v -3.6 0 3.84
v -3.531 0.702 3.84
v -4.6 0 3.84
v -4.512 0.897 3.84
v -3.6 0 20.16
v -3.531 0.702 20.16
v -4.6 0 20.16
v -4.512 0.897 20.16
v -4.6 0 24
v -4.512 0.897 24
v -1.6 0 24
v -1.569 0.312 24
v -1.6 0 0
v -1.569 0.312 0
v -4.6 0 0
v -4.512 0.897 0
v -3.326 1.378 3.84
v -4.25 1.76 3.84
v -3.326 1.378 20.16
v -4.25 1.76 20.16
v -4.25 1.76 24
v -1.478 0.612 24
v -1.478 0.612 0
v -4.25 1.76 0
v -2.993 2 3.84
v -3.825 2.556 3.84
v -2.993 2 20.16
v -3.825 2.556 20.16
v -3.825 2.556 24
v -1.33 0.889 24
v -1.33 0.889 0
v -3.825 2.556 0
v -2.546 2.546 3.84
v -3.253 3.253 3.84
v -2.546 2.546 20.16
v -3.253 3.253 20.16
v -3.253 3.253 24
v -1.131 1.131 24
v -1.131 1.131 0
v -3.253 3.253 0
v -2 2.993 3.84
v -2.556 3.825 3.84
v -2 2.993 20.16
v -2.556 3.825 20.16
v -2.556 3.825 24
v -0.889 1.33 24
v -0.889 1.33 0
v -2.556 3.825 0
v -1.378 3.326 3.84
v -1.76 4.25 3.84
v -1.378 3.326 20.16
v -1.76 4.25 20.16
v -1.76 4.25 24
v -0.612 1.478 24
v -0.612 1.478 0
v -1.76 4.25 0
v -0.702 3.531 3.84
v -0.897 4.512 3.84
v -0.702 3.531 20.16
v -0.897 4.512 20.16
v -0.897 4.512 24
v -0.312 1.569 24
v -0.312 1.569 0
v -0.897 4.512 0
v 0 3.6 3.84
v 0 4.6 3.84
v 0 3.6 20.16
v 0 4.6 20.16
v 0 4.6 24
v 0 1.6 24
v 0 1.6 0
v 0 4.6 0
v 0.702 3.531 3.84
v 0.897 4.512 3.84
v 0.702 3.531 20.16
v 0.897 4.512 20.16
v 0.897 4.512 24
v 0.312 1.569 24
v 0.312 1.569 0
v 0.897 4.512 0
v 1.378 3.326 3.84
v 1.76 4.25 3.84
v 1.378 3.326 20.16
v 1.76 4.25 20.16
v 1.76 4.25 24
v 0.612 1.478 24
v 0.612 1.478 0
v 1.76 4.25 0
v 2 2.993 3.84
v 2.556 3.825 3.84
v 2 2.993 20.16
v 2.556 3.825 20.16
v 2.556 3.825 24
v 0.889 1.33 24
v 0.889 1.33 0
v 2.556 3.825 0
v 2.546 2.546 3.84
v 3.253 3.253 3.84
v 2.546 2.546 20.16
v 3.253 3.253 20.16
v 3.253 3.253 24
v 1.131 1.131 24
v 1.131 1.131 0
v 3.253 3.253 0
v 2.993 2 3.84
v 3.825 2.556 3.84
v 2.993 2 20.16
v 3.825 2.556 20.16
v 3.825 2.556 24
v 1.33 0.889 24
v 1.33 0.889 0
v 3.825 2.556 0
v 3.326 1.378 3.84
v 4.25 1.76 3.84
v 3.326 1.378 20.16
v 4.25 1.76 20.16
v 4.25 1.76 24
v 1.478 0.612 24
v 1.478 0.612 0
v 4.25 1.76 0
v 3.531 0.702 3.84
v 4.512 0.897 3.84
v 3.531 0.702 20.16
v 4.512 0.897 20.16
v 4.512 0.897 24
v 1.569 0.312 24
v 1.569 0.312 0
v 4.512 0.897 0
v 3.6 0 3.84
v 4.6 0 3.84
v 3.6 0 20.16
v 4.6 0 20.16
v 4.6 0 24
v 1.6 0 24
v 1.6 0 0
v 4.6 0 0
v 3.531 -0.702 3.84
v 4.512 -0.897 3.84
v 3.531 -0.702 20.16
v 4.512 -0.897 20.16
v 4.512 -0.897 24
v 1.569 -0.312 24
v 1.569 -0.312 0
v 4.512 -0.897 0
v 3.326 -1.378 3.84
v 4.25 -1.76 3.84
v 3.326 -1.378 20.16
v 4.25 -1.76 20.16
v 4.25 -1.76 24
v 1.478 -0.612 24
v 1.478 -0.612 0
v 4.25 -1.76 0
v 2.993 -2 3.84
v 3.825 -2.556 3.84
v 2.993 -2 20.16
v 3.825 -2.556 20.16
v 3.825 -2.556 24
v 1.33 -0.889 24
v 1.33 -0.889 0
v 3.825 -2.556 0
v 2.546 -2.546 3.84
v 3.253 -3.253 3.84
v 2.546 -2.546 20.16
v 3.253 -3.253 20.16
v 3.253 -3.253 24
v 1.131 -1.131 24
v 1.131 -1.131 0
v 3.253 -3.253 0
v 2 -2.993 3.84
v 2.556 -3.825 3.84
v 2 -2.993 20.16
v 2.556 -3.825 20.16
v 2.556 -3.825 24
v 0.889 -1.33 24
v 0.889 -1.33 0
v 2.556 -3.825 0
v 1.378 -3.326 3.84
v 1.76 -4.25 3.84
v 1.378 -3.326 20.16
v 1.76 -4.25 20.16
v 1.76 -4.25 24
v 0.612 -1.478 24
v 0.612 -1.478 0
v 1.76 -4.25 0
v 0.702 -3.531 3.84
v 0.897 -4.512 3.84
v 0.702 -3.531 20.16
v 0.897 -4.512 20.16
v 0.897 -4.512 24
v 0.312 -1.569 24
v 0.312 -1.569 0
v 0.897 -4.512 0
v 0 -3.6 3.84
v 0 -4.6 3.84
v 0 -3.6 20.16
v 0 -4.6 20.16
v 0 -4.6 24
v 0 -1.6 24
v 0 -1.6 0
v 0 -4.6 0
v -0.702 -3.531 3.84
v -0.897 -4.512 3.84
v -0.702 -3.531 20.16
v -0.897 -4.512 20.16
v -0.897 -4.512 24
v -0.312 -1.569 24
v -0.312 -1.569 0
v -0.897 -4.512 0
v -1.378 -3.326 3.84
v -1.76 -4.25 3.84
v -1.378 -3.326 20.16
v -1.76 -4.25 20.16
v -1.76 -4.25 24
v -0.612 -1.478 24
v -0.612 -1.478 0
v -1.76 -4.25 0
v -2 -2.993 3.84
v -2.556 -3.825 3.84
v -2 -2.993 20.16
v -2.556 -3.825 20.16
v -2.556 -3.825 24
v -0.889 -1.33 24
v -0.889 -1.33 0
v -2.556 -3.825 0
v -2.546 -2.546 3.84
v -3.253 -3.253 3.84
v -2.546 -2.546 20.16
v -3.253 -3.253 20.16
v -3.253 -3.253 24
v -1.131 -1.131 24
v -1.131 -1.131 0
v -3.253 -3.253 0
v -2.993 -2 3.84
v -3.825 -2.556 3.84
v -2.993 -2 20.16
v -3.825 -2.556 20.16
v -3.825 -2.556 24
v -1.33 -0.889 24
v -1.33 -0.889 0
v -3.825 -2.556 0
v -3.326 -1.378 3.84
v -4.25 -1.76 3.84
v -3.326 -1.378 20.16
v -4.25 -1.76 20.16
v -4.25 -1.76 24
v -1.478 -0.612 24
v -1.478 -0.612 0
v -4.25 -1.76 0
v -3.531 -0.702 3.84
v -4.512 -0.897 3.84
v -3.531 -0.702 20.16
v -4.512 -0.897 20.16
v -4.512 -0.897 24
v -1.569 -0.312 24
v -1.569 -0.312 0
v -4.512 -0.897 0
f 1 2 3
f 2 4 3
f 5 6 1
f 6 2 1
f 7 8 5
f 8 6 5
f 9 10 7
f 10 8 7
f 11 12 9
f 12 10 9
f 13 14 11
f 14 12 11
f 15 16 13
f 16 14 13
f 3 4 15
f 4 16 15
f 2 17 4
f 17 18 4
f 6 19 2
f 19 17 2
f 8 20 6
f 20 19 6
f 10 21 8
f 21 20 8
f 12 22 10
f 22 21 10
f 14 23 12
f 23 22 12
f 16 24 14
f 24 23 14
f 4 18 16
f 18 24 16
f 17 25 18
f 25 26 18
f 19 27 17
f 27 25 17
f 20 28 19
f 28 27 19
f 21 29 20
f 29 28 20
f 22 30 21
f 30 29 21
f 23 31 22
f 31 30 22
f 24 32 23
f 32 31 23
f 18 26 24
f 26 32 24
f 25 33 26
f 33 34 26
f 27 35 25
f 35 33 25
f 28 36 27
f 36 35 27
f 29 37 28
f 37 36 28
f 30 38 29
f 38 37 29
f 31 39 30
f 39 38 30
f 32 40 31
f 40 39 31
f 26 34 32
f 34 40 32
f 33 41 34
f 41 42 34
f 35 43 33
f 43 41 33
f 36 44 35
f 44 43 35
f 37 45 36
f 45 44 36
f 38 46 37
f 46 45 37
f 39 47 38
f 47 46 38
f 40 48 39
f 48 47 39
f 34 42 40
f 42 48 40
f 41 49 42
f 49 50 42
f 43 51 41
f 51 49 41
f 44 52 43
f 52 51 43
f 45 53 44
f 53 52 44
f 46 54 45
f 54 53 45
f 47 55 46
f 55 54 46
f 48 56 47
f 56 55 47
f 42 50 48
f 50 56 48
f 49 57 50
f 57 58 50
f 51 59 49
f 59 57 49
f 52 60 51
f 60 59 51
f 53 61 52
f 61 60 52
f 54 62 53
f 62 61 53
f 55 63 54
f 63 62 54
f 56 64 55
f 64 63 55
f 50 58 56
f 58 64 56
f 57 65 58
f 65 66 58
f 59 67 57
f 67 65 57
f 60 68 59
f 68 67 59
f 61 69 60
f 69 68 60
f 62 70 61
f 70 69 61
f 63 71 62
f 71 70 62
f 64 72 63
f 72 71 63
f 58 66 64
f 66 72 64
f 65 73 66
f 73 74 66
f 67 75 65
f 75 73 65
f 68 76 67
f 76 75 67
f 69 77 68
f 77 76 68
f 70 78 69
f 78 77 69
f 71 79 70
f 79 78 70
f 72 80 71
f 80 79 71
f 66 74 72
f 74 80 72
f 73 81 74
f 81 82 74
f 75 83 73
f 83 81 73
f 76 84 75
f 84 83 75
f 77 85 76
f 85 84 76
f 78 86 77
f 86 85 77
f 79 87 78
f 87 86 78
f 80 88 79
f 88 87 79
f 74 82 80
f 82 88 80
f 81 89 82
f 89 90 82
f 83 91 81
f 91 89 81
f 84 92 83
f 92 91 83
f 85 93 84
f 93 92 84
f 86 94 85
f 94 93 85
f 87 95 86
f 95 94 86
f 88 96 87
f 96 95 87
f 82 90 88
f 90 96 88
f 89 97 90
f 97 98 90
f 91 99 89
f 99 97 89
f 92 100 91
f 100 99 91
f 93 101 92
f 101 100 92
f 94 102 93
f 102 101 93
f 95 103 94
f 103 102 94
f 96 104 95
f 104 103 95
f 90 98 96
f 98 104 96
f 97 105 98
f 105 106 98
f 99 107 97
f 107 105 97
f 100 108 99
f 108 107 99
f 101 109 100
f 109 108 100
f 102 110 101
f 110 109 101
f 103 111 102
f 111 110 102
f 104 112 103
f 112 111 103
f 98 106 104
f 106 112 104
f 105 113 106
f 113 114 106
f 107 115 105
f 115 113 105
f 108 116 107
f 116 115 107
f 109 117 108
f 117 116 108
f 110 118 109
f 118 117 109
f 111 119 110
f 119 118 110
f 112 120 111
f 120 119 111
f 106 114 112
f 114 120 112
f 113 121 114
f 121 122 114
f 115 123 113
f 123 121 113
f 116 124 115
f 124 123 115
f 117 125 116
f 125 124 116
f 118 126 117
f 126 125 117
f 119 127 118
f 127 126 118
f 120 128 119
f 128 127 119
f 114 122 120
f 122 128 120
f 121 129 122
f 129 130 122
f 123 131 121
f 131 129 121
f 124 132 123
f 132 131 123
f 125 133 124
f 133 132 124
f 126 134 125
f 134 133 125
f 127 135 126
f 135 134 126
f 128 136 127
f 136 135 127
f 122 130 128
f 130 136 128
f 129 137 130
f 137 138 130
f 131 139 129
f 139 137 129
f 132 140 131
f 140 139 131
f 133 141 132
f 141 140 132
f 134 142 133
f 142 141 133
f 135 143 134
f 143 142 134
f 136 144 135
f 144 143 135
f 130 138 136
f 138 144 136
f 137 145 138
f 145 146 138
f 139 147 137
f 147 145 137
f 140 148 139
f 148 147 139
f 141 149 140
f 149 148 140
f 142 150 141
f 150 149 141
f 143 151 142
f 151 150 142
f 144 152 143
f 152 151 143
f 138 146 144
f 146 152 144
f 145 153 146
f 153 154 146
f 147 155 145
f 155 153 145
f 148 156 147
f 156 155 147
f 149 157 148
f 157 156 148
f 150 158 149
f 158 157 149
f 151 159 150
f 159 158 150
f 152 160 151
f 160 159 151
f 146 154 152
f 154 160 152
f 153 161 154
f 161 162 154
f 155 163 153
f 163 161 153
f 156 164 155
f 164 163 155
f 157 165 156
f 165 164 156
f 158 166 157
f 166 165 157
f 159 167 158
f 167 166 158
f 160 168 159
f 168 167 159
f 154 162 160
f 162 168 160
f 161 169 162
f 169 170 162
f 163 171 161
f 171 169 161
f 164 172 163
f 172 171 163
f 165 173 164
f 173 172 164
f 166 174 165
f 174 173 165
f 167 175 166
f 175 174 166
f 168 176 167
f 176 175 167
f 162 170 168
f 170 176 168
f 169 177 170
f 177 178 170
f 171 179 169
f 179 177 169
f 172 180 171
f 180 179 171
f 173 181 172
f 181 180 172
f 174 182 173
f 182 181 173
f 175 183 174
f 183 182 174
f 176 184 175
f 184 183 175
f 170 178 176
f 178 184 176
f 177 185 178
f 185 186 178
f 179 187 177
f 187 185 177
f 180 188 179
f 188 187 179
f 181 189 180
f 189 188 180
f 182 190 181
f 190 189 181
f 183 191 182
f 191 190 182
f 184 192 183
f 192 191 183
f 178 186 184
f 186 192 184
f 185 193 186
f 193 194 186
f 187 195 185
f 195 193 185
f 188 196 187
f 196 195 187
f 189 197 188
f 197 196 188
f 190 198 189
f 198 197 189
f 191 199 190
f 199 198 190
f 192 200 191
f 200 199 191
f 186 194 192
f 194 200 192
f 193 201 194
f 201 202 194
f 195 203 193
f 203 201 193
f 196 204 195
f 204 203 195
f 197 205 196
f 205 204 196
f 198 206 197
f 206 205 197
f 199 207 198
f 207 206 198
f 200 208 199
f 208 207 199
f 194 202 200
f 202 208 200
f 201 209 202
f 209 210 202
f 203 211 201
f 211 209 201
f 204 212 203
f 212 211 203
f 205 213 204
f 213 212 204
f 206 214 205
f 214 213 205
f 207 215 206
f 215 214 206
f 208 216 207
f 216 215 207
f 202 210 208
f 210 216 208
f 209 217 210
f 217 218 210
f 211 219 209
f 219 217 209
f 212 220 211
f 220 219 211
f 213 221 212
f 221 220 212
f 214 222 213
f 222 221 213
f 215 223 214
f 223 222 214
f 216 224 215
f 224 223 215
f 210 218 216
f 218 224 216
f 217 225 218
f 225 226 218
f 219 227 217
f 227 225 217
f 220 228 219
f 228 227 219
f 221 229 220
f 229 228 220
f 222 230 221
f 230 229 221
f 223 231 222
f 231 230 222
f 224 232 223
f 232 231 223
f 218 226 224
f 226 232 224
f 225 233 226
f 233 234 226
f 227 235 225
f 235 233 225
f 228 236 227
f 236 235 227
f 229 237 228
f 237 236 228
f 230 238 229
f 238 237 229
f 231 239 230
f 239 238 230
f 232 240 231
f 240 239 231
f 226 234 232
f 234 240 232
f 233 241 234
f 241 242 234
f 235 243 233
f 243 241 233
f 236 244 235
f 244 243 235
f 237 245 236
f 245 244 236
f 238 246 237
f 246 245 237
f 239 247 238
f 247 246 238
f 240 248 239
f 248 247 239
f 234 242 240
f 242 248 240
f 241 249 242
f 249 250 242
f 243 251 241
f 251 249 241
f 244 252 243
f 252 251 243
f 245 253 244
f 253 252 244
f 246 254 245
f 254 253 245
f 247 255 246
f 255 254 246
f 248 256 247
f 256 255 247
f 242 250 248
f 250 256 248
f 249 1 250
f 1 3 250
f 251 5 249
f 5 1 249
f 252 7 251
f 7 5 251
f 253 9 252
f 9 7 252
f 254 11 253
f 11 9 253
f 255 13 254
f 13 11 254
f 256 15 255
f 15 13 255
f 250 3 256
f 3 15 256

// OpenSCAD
$fn = 32;

// ----------------------------------------------------------------------
// Profiled standoff: spool spacer, 24 mm long, bore 3.2 mm
// ----------------------------------------------------------------------

// --- parameters (mm) ---
revolve_angle = 360;      // full turn around the Z axis
profile_points = 8;       // points of the closed outline

profile = [[1.6, 0], [4.6, 0], [4.6, 3.84], [3.6, 3.84], [3.6, 20.16], [4.6, 20.16], [4.6, 24], [1.6, 24]];  // single closed polygon, 8 points, counter clockwise

// --- the one profile operation ---
rotate_extrude(angle = revolve_angle) polygon(points = profile);
